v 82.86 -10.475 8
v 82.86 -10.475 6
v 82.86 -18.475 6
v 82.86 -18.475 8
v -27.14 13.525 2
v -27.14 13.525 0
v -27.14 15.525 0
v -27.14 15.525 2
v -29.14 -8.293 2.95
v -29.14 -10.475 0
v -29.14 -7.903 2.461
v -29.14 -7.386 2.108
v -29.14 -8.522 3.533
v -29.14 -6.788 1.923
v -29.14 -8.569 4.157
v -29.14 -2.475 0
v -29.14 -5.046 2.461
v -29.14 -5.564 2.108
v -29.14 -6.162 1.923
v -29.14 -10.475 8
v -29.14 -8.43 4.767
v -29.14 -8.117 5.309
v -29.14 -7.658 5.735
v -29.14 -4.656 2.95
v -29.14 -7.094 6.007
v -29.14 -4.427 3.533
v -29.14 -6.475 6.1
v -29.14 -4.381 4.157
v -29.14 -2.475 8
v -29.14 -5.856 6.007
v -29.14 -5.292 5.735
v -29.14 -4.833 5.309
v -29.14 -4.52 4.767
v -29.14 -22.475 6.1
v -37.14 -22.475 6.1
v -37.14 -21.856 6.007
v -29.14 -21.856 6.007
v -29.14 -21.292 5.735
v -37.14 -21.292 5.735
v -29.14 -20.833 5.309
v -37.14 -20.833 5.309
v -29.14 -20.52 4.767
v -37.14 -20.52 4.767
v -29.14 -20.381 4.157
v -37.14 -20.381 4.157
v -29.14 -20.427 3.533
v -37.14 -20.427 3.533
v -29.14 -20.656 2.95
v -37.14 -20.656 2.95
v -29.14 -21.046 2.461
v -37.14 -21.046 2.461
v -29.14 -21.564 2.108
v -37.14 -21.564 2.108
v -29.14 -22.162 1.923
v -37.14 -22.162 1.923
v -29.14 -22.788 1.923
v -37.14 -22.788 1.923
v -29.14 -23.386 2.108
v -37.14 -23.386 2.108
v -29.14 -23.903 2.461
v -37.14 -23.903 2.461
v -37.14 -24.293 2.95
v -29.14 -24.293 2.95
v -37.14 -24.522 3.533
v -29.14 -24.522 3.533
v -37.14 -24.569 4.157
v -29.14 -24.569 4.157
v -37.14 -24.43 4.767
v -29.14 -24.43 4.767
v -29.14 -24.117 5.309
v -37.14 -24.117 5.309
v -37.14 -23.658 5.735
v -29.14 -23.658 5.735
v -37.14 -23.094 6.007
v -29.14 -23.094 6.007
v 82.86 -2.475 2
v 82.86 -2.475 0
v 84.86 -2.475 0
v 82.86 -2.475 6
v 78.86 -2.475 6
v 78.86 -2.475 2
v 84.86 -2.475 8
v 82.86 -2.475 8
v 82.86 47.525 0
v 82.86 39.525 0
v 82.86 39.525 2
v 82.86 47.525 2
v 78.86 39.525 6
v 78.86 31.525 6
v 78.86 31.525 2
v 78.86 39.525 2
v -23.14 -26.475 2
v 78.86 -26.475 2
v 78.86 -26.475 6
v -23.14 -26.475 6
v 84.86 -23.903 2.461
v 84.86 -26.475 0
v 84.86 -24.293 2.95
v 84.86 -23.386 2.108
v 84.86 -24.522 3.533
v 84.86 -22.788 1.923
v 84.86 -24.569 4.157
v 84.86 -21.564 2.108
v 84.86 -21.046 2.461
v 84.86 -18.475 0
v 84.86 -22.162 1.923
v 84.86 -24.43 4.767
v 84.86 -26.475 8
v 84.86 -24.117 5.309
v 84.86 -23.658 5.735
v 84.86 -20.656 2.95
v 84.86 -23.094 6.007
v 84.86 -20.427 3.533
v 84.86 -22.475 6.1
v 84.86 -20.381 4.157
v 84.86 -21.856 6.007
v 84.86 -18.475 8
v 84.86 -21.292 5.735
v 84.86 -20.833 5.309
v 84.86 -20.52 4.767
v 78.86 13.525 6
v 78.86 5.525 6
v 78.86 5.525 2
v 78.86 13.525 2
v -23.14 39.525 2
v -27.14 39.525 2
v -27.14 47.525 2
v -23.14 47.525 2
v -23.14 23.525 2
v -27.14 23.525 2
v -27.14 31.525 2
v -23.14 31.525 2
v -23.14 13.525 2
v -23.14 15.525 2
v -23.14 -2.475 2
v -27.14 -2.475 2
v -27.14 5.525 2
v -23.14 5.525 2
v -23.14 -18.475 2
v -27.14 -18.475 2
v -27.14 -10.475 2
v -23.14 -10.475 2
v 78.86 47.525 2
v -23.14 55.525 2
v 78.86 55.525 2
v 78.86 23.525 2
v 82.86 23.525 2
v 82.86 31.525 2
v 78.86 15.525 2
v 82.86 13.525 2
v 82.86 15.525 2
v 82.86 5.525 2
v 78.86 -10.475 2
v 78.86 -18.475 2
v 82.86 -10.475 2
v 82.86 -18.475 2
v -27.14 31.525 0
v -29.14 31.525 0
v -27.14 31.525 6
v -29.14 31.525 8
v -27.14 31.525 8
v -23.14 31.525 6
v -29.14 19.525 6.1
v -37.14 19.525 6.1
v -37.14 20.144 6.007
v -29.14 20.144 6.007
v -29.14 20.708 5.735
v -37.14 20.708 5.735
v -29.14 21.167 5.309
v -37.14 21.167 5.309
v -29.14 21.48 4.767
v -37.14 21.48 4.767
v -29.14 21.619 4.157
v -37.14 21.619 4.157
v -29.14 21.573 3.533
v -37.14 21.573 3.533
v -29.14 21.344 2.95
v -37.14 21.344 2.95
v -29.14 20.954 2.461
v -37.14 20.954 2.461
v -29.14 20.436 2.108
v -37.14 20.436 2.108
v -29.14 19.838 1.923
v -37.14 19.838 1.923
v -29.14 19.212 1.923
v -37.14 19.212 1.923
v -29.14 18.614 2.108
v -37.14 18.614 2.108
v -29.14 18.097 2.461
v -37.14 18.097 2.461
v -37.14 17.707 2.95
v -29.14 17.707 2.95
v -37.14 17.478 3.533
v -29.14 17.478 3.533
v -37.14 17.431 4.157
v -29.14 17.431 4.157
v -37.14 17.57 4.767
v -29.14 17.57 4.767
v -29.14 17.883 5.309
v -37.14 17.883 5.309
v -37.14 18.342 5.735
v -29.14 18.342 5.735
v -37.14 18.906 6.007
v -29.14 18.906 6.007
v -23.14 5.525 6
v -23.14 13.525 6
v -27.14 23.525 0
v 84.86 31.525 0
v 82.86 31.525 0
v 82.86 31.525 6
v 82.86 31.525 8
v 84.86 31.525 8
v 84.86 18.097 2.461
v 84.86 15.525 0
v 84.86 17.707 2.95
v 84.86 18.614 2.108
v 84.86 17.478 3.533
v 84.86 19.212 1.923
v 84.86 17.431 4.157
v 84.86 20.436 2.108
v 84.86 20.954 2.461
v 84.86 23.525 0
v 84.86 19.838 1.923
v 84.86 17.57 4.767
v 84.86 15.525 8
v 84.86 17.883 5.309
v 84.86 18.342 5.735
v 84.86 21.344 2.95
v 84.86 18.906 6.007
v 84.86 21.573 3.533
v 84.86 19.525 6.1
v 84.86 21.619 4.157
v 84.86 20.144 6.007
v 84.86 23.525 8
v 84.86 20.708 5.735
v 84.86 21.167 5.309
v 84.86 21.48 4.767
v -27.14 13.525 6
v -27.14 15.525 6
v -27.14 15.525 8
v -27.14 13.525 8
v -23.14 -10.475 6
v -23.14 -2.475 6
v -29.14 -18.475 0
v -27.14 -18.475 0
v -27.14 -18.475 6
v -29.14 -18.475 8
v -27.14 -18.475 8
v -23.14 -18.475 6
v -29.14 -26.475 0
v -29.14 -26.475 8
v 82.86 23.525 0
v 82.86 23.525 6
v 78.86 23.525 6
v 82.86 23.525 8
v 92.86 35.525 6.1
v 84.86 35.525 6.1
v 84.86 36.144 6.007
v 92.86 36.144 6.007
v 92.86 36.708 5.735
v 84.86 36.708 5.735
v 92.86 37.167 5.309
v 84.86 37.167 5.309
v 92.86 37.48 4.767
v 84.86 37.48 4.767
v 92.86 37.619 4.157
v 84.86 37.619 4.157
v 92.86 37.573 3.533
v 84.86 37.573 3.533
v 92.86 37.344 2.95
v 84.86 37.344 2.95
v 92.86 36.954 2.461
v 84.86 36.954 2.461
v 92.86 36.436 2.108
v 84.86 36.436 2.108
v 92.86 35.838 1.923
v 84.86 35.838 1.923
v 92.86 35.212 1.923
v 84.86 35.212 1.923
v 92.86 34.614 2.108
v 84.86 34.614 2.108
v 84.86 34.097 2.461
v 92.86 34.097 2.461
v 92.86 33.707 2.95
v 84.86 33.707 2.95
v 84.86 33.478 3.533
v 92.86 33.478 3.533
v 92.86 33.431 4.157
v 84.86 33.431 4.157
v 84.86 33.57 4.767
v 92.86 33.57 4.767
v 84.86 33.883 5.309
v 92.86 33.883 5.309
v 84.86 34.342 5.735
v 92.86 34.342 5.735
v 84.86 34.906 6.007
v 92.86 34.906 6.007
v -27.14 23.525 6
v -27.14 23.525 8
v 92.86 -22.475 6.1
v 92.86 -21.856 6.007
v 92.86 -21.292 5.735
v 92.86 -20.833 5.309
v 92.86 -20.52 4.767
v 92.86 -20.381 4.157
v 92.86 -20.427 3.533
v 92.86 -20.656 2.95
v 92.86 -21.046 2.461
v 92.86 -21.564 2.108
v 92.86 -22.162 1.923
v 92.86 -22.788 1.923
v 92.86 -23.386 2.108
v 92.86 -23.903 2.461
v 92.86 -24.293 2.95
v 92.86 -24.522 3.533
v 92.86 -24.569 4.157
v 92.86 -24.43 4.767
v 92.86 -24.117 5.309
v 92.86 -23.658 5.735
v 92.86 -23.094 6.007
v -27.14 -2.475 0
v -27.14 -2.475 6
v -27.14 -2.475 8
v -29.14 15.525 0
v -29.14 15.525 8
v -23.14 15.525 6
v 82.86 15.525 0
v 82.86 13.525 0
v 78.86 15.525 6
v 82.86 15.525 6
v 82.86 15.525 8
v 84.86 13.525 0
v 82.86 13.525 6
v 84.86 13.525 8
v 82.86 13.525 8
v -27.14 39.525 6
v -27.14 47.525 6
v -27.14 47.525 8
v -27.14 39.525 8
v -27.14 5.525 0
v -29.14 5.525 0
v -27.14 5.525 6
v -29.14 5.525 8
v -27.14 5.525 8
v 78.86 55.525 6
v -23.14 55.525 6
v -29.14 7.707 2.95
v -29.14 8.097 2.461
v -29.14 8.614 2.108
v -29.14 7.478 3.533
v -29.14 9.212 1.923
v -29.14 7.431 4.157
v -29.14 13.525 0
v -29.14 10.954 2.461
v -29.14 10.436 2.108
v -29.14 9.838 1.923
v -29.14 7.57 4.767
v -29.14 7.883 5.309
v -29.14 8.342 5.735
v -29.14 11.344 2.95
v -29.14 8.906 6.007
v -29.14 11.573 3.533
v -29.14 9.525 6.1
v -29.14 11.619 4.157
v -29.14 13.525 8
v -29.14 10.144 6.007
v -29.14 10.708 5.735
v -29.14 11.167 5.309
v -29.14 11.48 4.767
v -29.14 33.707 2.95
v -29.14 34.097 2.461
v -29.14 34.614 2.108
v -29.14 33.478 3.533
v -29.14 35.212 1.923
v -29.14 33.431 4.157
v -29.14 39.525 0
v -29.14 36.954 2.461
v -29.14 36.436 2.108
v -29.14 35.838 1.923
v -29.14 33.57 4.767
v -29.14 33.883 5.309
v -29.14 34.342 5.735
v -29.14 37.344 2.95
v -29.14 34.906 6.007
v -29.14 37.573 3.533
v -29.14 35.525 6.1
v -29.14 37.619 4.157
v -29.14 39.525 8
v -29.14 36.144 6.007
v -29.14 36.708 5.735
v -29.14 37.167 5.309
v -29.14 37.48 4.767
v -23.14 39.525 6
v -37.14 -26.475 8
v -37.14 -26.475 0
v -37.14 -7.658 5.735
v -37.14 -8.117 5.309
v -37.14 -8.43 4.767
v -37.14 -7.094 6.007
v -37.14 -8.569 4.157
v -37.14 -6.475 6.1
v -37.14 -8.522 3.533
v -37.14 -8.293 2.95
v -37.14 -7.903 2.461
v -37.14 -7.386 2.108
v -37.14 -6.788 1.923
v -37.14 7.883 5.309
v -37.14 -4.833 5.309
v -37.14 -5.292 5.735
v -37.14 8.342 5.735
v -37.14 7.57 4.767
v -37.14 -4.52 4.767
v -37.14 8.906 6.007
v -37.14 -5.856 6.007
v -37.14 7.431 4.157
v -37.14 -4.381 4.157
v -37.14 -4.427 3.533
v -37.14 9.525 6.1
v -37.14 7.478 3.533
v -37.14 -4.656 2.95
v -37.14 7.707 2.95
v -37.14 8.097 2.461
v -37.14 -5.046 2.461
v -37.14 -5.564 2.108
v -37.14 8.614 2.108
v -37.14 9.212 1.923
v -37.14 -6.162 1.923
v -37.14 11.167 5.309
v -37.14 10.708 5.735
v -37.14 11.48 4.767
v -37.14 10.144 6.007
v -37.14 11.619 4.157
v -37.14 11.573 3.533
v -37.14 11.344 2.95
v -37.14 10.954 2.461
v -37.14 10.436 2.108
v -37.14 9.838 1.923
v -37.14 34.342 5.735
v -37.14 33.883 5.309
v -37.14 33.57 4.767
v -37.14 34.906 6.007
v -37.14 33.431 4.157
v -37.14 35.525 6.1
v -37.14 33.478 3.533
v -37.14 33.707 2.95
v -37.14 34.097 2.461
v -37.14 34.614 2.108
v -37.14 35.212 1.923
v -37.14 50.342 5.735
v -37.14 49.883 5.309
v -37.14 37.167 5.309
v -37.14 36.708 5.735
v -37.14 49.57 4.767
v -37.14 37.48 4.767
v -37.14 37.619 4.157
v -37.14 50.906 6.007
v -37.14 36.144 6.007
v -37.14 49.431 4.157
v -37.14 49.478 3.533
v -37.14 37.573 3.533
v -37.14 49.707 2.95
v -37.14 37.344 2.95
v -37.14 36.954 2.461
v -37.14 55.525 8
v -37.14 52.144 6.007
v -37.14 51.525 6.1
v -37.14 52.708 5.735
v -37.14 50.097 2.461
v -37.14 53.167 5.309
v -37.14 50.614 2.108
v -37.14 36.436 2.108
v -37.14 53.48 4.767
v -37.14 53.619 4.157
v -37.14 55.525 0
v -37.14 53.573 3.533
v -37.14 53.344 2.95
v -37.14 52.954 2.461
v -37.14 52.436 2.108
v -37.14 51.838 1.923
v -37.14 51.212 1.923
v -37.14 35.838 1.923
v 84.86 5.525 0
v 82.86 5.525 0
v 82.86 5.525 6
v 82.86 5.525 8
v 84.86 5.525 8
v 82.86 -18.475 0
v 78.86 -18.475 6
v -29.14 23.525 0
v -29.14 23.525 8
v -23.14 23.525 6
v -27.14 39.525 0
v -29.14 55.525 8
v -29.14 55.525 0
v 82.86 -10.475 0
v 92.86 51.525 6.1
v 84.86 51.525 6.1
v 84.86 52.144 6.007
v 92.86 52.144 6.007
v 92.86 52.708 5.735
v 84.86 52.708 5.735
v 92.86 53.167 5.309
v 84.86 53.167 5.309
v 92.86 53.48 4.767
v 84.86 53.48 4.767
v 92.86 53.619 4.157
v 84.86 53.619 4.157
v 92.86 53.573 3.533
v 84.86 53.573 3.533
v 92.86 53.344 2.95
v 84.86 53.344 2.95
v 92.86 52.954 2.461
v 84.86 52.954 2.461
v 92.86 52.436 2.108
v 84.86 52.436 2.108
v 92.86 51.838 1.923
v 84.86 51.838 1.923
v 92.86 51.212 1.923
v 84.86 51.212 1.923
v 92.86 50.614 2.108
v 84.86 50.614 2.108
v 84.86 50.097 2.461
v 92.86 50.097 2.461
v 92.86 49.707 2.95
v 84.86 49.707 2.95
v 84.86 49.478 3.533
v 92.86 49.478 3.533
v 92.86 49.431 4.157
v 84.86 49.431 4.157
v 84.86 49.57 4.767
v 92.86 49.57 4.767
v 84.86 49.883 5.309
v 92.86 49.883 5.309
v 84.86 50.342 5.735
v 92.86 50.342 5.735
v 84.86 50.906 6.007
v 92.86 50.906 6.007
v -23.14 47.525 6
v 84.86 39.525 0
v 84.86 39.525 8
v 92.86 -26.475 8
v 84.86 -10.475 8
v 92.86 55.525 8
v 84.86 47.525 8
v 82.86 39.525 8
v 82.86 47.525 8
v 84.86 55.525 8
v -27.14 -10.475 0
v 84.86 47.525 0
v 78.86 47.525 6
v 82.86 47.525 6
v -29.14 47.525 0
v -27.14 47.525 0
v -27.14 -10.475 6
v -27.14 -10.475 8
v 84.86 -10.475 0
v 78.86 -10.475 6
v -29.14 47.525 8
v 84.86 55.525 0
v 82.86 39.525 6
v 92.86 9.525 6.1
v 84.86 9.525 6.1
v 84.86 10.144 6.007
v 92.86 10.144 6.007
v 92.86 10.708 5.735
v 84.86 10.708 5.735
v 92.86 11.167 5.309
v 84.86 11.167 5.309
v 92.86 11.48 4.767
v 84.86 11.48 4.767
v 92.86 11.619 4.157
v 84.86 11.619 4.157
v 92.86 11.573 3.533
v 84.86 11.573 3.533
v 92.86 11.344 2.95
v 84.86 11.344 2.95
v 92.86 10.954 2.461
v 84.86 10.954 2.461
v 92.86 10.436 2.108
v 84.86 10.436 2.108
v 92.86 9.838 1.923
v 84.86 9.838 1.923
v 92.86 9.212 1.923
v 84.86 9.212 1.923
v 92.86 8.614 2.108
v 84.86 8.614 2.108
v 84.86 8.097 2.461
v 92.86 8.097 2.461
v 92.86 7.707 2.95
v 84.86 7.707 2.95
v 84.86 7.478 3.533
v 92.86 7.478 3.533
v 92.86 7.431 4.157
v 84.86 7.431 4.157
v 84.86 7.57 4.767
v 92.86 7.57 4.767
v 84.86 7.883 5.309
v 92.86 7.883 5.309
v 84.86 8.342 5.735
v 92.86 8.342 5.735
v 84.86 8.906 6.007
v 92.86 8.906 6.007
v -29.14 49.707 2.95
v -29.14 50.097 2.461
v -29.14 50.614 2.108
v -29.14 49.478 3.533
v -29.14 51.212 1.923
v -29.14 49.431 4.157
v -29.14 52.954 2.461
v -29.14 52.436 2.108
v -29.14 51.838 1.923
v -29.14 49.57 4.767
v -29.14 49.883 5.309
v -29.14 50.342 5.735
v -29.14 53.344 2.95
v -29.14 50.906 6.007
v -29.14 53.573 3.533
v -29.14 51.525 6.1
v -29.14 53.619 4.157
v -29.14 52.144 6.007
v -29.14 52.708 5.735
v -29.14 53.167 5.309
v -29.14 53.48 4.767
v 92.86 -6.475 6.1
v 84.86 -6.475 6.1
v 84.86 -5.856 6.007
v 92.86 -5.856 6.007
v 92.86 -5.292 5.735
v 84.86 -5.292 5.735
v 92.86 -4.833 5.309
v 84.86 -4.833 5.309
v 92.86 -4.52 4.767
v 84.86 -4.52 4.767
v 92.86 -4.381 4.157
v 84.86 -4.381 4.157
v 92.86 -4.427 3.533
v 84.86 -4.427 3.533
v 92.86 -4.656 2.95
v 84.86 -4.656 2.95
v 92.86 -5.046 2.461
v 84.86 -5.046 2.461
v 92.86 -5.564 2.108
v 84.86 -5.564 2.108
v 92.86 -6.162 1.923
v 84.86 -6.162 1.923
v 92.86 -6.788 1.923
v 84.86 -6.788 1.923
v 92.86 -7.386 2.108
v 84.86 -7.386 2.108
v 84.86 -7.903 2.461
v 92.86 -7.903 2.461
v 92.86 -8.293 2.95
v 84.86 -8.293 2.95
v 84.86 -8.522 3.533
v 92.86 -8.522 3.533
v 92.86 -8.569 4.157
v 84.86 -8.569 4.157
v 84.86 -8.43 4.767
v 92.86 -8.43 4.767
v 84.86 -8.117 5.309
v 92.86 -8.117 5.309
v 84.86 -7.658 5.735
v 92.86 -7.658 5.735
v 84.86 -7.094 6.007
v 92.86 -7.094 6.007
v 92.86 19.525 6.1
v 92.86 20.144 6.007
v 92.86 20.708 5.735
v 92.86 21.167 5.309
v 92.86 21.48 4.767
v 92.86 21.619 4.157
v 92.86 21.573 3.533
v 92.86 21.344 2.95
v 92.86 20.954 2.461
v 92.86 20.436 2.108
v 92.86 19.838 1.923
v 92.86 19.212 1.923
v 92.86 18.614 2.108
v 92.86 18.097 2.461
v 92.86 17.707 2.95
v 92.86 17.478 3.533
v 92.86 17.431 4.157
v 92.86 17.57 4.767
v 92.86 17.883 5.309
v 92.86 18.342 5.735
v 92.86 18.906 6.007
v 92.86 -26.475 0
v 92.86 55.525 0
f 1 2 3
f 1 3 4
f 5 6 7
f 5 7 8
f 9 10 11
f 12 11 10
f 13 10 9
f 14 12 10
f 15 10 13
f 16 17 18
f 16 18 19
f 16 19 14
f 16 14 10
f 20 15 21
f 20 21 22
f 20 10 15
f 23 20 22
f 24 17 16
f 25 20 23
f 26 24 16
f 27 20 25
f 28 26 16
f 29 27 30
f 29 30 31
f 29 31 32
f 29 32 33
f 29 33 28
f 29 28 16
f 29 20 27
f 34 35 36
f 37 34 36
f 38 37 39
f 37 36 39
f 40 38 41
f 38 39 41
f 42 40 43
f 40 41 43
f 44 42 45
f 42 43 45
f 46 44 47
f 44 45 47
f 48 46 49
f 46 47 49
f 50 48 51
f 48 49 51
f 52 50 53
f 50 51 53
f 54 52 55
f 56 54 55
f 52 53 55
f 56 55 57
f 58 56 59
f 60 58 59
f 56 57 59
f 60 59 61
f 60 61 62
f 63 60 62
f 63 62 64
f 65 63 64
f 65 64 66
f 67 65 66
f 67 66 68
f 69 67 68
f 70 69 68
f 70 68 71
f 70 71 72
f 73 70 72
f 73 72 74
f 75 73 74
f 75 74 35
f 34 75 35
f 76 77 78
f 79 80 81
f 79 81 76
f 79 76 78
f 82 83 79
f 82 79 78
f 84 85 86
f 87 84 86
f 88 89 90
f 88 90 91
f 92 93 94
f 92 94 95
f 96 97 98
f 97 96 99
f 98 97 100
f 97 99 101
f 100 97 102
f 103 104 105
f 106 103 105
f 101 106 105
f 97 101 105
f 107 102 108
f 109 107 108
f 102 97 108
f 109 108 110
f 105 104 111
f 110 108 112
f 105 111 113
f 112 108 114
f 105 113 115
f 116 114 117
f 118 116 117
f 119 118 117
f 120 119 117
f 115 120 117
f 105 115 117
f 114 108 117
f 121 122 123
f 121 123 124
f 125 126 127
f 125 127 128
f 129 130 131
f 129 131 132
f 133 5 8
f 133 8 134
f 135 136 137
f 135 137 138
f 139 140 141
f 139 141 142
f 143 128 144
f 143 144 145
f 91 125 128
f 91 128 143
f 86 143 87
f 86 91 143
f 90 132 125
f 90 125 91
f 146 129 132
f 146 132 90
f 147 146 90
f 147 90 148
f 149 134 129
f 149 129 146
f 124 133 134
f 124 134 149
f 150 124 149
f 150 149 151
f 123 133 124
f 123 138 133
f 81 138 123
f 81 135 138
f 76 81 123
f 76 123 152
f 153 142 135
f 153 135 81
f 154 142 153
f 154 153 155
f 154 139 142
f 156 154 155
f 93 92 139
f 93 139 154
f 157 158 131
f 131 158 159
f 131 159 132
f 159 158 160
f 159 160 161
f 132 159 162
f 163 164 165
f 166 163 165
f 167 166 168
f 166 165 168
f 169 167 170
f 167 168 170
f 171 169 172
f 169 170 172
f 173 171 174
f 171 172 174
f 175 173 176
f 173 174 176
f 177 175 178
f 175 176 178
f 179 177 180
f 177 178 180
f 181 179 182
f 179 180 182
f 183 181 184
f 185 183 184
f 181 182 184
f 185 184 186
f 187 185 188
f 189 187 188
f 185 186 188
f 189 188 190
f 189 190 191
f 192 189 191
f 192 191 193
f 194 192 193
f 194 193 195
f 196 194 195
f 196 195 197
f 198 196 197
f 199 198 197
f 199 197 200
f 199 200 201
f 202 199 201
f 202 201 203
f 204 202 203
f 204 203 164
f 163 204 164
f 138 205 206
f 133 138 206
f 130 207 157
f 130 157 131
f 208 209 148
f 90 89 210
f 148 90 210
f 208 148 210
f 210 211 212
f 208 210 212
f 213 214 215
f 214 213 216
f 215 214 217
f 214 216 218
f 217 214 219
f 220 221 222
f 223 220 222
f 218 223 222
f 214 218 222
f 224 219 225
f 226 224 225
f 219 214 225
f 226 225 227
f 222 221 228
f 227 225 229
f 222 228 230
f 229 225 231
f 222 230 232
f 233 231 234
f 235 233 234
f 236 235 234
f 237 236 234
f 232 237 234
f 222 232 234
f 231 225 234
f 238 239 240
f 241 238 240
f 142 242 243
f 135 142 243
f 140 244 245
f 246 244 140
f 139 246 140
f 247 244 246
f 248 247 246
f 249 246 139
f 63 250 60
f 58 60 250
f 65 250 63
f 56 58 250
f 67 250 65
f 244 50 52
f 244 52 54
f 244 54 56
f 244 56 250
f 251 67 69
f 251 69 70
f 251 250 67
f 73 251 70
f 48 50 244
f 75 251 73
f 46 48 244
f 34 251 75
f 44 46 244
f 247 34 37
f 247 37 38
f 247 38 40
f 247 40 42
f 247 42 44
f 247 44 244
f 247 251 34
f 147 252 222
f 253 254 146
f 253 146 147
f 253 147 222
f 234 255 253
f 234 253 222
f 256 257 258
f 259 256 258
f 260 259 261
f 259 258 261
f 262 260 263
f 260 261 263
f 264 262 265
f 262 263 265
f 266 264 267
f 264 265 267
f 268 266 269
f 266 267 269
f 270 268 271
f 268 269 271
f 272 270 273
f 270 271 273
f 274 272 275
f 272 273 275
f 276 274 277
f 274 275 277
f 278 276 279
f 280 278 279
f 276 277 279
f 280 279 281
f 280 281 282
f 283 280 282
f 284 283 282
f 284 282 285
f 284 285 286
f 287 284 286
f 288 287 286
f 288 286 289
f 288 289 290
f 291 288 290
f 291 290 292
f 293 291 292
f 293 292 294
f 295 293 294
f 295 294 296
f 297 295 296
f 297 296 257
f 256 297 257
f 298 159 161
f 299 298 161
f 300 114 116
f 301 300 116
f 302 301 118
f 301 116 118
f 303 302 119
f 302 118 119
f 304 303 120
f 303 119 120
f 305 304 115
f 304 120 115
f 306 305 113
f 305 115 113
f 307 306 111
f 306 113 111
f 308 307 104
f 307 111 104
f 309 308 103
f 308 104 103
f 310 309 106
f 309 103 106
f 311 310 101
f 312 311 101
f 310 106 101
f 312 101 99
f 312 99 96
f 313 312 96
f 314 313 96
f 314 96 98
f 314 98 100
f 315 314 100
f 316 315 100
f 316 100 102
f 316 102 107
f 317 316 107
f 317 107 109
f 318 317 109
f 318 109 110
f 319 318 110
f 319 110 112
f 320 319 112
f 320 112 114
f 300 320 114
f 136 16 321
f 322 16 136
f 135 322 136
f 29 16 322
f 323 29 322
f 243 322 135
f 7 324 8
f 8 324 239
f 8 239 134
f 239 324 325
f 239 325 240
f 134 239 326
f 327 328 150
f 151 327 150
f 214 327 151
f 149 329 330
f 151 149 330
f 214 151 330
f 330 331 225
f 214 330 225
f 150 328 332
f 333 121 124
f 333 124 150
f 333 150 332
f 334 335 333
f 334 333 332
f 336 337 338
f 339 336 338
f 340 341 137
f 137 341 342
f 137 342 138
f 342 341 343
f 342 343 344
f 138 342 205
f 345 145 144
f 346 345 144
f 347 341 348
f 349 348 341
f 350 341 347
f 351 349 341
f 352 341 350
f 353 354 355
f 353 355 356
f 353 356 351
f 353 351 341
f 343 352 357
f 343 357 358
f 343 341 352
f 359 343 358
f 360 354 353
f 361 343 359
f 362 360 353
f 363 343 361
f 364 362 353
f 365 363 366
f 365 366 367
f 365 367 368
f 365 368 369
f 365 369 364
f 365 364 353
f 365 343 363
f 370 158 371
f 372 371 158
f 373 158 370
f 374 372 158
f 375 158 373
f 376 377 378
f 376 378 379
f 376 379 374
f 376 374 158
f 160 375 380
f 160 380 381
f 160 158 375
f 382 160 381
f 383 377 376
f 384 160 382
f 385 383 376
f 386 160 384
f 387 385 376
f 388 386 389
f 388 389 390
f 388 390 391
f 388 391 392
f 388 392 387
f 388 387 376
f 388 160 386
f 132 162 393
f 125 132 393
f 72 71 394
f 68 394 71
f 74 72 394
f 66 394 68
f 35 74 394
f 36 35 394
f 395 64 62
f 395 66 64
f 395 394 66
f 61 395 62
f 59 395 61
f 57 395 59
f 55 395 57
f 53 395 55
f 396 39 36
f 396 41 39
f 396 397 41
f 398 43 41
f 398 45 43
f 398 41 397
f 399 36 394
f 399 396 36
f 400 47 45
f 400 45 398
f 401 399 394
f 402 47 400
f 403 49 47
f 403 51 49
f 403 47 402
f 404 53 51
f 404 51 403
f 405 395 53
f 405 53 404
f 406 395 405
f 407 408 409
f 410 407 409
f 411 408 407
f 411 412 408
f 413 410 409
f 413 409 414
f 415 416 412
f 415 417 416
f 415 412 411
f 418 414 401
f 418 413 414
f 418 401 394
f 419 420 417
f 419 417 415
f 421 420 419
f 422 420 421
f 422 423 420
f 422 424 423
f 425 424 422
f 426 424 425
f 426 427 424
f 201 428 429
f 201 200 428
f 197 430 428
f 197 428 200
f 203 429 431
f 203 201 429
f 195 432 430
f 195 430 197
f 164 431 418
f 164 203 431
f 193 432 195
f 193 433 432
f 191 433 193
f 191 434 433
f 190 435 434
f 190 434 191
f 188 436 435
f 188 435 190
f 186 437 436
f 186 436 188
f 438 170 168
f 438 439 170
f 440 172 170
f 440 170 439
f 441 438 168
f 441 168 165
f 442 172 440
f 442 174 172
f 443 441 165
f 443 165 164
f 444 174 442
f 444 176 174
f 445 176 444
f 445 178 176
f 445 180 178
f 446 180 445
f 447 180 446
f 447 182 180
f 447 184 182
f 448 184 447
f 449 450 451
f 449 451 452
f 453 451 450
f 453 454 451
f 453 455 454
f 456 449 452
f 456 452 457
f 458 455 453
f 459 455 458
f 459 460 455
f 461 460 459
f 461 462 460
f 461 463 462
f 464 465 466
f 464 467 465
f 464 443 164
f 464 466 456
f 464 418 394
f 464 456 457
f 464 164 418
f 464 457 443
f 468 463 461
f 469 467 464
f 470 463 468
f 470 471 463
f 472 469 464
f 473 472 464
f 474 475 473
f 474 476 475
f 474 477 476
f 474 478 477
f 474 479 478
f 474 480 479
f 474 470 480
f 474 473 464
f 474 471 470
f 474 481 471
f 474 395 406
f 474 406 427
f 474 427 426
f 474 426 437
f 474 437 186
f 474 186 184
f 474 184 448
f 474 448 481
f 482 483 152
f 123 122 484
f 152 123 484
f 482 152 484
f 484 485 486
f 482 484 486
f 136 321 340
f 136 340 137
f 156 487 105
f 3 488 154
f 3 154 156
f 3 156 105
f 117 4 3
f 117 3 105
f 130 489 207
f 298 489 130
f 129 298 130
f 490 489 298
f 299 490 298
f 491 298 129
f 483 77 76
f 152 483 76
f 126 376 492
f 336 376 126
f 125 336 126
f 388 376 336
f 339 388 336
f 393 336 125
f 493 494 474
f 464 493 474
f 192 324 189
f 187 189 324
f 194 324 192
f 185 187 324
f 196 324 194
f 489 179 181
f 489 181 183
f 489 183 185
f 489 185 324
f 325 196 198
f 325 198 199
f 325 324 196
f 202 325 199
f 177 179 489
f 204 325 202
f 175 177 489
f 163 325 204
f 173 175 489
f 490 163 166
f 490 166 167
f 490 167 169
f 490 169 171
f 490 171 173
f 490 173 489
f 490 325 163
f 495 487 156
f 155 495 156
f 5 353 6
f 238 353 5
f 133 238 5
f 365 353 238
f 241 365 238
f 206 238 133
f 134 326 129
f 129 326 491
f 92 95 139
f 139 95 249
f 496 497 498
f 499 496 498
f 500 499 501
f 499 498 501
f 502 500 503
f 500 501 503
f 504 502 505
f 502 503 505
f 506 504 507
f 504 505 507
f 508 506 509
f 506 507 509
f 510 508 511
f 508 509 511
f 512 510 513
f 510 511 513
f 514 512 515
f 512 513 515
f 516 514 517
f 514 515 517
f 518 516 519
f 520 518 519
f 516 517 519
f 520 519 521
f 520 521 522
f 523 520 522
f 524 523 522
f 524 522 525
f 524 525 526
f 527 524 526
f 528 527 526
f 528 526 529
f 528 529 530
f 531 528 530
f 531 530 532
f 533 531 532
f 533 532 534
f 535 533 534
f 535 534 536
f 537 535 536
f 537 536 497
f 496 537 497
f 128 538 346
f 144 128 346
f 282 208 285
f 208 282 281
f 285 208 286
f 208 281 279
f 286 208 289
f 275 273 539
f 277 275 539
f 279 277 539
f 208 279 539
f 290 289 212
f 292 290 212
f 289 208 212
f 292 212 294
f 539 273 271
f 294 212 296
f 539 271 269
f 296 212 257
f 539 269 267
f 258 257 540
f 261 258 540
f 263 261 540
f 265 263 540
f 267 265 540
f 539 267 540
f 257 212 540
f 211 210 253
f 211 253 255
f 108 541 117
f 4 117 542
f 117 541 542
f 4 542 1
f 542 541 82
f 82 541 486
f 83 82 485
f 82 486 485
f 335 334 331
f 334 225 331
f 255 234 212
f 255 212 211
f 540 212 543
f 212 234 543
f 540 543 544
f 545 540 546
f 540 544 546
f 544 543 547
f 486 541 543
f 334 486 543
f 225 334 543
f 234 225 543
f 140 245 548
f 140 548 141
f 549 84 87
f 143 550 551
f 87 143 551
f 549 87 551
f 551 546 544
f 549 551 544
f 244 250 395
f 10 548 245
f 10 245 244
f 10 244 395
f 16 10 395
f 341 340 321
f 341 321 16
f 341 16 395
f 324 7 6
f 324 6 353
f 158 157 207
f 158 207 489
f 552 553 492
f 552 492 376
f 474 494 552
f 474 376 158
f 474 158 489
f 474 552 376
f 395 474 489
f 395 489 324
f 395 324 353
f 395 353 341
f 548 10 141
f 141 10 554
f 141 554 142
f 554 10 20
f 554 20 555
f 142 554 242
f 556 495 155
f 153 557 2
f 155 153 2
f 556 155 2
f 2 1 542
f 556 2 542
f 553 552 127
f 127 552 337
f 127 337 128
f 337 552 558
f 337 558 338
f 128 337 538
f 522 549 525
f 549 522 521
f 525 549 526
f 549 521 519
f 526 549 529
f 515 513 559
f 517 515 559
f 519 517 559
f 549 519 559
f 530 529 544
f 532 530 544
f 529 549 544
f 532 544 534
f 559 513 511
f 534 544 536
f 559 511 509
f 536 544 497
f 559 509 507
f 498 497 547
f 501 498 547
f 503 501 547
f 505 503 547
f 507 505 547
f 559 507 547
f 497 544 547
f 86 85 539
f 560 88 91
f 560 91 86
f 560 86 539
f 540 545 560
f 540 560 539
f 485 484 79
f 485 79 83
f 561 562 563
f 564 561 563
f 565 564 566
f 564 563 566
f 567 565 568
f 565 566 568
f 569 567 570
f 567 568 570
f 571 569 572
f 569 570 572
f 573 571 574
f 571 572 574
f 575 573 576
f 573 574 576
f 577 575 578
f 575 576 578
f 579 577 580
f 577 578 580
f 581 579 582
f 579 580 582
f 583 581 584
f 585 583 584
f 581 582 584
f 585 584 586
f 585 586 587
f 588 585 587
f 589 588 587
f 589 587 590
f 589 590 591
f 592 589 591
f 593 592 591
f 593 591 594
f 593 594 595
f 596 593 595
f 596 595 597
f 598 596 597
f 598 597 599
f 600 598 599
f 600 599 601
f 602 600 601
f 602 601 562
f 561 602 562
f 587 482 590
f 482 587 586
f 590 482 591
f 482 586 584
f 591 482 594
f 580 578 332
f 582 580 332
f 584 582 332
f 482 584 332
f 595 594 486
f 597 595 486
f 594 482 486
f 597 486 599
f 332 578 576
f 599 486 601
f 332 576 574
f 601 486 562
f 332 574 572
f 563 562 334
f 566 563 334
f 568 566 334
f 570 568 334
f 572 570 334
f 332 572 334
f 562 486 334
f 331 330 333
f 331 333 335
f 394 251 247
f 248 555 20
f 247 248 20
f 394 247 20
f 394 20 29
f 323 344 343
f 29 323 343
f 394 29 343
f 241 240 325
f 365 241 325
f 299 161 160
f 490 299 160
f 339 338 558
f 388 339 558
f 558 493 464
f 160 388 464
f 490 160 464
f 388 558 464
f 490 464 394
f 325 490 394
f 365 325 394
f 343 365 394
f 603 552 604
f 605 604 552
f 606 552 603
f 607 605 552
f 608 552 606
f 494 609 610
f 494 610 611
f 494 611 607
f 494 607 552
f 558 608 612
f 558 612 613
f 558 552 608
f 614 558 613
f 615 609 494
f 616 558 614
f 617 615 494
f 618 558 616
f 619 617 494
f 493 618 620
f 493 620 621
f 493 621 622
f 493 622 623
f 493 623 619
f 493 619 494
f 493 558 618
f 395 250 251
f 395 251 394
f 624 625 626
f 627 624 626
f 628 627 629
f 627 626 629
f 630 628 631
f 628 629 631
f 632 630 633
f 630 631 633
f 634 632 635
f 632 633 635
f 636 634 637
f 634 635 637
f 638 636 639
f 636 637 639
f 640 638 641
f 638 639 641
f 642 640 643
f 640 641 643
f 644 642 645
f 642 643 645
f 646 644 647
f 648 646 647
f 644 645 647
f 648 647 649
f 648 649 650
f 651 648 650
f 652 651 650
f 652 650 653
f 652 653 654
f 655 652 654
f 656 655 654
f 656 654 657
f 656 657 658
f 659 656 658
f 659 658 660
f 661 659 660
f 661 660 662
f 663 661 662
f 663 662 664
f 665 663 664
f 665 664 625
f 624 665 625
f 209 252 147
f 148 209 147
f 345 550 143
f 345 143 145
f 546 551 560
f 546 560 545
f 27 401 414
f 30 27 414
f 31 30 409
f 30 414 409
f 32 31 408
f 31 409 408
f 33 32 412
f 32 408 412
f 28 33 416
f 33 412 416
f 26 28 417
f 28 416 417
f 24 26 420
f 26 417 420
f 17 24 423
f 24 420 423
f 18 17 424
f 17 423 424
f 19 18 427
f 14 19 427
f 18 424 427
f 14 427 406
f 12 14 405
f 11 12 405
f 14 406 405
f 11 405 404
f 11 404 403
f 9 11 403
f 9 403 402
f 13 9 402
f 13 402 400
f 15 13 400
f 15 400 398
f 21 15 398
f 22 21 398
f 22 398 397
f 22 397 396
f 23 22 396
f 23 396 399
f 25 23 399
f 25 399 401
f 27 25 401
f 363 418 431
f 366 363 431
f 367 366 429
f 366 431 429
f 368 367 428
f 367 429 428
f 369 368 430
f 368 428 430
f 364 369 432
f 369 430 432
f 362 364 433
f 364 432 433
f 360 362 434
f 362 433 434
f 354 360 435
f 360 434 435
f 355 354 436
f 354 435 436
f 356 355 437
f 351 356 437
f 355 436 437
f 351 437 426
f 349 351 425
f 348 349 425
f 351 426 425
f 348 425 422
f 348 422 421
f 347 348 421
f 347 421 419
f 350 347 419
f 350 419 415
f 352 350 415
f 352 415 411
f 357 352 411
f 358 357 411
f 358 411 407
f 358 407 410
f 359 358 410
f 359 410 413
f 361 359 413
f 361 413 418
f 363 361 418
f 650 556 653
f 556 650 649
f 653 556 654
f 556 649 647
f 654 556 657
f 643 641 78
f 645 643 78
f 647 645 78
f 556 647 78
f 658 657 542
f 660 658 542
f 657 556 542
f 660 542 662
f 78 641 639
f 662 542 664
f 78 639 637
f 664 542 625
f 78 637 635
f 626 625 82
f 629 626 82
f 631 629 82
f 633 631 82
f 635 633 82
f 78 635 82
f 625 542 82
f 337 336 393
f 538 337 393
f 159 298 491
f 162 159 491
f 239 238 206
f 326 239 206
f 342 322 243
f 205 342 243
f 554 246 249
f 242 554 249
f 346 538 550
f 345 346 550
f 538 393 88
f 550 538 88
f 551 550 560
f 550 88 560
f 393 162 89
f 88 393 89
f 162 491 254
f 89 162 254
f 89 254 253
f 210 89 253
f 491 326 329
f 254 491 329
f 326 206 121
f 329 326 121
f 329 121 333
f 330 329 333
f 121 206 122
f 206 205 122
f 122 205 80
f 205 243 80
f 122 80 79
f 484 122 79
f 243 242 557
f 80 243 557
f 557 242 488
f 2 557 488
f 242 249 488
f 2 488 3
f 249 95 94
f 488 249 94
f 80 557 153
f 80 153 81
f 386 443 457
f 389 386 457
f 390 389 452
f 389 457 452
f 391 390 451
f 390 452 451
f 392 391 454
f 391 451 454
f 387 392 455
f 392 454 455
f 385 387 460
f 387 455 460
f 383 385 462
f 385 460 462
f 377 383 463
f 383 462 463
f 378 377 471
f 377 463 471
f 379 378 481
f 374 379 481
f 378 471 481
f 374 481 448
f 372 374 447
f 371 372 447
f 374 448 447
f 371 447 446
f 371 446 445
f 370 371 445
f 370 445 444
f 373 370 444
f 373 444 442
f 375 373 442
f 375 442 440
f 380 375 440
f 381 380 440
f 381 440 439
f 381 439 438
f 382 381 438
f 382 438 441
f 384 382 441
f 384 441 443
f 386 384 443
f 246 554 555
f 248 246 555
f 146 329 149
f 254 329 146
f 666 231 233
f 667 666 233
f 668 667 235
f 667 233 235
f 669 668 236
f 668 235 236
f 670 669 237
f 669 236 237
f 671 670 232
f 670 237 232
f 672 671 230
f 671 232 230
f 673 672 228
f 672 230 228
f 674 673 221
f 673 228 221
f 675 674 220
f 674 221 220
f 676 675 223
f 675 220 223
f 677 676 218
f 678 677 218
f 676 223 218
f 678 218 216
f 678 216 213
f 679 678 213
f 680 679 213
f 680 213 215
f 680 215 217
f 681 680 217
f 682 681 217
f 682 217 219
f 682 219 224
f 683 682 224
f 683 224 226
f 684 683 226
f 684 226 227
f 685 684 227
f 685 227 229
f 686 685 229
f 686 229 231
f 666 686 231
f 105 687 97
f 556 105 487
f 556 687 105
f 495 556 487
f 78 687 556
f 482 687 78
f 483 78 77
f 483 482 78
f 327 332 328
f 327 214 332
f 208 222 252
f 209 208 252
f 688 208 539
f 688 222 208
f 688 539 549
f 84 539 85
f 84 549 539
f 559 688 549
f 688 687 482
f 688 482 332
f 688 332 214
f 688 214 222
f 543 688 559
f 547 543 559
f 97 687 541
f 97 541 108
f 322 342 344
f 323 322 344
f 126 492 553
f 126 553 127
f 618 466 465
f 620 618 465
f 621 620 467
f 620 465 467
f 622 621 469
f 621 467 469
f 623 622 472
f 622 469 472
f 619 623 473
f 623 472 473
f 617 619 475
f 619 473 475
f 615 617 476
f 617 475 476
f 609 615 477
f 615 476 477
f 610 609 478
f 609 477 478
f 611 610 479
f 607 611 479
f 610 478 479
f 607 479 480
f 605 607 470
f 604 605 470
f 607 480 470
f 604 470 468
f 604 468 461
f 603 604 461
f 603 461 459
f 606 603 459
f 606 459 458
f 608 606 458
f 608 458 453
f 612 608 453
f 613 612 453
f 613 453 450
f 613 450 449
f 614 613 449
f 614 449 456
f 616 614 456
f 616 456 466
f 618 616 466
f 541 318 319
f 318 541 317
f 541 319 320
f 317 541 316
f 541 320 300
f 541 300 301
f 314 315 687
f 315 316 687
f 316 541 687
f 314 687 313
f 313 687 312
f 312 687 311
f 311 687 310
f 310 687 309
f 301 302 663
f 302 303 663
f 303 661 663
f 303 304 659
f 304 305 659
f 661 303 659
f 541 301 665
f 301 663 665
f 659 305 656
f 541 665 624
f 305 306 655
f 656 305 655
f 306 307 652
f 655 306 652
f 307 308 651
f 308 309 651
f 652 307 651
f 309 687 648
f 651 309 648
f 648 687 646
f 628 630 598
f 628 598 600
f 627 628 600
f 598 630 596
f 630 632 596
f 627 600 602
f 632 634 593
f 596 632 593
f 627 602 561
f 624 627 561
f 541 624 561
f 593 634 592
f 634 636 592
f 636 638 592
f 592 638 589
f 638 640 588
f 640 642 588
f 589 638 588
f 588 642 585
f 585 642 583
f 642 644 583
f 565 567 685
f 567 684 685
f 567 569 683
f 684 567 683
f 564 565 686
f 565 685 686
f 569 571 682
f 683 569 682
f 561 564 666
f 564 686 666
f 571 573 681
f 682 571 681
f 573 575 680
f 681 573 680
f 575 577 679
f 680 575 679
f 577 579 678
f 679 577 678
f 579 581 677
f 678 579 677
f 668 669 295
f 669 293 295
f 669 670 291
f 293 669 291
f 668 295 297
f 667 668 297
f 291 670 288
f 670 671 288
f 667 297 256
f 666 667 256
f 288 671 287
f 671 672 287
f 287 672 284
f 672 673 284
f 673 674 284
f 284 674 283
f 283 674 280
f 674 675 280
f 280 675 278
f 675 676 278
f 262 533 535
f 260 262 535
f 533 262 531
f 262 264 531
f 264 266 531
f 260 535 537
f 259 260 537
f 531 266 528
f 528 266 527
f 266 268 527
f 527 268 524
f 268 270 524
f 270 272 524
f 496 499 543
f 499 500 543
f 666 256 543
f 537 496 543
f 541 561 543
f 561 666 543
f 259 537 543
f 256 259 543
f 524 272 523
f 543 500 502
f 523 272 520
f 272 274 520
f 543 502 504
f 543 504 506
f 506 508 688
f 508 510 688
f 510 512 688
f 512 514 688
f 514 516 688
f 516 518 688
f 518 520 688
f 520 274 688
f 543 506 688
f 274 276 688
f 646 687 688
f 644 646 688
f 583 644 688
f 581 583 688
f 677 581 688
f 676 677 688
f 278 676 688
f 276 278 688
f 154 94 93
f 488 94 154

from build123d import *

# Parameters (mm, degrees)
SKETCH_1_W          = 130
SKETCH_1_H          = 82
EXTRUDE_1_DEPTH     = 8
SKETCH_2_R          = 2.1
CUT_EXTRUDE_1_DEPTH = 142.58762947
SKETCH_3_W          = 110
SKETCH_3_H          = 82
EXTRUDE_2_DEPTH     = 8
SKETCH_4_W          = 110
SKETCH_4_H          = 2
CUT_EXTRUDE_2_DEPTH = 125.141148579
SKETCH_7_W          = 6
SKETCH_7_H          = 8
CUT_EXTRUDE_3_DEPTH = 10


with BuildPart() as part:
    # 草圖1 → 填料-伸長1 (new body)
    with BuildSketch(Plane.XY):
        with Locations((27.860243218, 14.525280899)):
            Rectangle(SKETCH_1_W, SKETCH_1_H)
    extrude(amount=EXTRUDE_1_DEPTH)

    # 草圖2 → 除料-伸長1 (cut, through all)
    with BuildSketch(Plane.ZY.offset(37.139756782)):
        with Locations((4, -22.474719101)):
            Circle(SKETCH_2_R)
        with Locations((4, -6.474719101)):
            Circle(SKETCH_2_R)
        with Locations((4, 9.525280899)):
            Circle(SKETCH_2_R)
        with Locations((4, 19.525280899)):
            Circle(SKETCH_2_R)
        with Locations((4, 35.525280899)):
            Circle(SKETCH_2_R)
        with Locations((4, 51.525280899)):
            Circle(SKETCH_2_R)
    extrude(amount=-CUT_EXTRUDE_1_DEPTH, mode=Mode.SUBTRACT)

    # 草圖3 → 填料-伸長2 (add)
    with BuildSketch(Plane(origin=(0, 0, 0), x_dir=(-1, 0, 0), z_dir=(0, 0, -1))):
        with Locations((-27.860243218, 14.525280899)):
            Rectangle(SKETCH_3_W, SKETCH_3_H)
    extrude(amount=-EXTRUDE_2_DEPTH)

    # 草圖4 → 除料-伸長2 (cut, through all)
    with BuildSketch(Plane.XZ.offset(26.474719101)):
        with Locations((27.860243218, 7)):
            Rectangle(SKETCH_4_W, SKETCH_4_H)
        with Locations((27.860243218, 1)):
            Rectangle(SKETCH_4_W, SKETCH_4_H)
    extrude(amount=-CUT_EXTRUDE_2_DEPTH, mode=Mode.SUBTRACT)

    # 草圖7 → 除料-伸長3 (cut)
    with BuildSketch(Plane.XY.offset(8)):
        with Locations((-26.139756782, 51.525280899)):
            Rectangle(SKETCH_7_W, SKETCH_7_H)
        with Locations((81.860243218, 51.525280899)):
            Rectangle(SKETCH_7_W, SKETCH_7_H)
        with Locations((-26.139756782, 35.525280899)):
            Rectangle(SKETCH_7_W, SKETCH_7_H)
        with Locations((81.860243218, 35.525280899)):
            Rectangle(SKETCH_7_W, SKETCH_7_H)
        with Locations((-26.139756782, 19.525280899)):
            Rectangle(SKETCH_7_W, SKETCH_7_H)
        with Locations((81.860243218, 19.525280899)):
            Rectangle(SKETCH_7_W, SKETCH_7_H)
        with Locations((-26.139756782, 9.525280899)):
            Rectangle(SKETCH_7_W, SKETCH_7_H)
        with Locations((81.860243218, 9.525280899)):
            Rectangle(SKETCH_7_W, SKETCH_7_H)
        with Locations((-26.139756782, -6.474719101)):
            Rectangle(SKETCH_7_W, SKETCH_7_H)
        with Locations((81.860243218, -6.474719101)):
            Rectangle(SKETCH_7_W, SKETCH_7_H)
        with Locations((-26.139756782, -22.474719101)):
            Rectangle(SKETCH_7_W, SKETCH_7_H)
        with Locations((81.860243218, -22.474719101)):
            Rectangle(SKETCH_7_W, SKETCH_7_H)
    extrude(amount=-CUT_EXTRUDE_3_DEPTH, mode=Mode.SUBTRACT)


solid = part.part
